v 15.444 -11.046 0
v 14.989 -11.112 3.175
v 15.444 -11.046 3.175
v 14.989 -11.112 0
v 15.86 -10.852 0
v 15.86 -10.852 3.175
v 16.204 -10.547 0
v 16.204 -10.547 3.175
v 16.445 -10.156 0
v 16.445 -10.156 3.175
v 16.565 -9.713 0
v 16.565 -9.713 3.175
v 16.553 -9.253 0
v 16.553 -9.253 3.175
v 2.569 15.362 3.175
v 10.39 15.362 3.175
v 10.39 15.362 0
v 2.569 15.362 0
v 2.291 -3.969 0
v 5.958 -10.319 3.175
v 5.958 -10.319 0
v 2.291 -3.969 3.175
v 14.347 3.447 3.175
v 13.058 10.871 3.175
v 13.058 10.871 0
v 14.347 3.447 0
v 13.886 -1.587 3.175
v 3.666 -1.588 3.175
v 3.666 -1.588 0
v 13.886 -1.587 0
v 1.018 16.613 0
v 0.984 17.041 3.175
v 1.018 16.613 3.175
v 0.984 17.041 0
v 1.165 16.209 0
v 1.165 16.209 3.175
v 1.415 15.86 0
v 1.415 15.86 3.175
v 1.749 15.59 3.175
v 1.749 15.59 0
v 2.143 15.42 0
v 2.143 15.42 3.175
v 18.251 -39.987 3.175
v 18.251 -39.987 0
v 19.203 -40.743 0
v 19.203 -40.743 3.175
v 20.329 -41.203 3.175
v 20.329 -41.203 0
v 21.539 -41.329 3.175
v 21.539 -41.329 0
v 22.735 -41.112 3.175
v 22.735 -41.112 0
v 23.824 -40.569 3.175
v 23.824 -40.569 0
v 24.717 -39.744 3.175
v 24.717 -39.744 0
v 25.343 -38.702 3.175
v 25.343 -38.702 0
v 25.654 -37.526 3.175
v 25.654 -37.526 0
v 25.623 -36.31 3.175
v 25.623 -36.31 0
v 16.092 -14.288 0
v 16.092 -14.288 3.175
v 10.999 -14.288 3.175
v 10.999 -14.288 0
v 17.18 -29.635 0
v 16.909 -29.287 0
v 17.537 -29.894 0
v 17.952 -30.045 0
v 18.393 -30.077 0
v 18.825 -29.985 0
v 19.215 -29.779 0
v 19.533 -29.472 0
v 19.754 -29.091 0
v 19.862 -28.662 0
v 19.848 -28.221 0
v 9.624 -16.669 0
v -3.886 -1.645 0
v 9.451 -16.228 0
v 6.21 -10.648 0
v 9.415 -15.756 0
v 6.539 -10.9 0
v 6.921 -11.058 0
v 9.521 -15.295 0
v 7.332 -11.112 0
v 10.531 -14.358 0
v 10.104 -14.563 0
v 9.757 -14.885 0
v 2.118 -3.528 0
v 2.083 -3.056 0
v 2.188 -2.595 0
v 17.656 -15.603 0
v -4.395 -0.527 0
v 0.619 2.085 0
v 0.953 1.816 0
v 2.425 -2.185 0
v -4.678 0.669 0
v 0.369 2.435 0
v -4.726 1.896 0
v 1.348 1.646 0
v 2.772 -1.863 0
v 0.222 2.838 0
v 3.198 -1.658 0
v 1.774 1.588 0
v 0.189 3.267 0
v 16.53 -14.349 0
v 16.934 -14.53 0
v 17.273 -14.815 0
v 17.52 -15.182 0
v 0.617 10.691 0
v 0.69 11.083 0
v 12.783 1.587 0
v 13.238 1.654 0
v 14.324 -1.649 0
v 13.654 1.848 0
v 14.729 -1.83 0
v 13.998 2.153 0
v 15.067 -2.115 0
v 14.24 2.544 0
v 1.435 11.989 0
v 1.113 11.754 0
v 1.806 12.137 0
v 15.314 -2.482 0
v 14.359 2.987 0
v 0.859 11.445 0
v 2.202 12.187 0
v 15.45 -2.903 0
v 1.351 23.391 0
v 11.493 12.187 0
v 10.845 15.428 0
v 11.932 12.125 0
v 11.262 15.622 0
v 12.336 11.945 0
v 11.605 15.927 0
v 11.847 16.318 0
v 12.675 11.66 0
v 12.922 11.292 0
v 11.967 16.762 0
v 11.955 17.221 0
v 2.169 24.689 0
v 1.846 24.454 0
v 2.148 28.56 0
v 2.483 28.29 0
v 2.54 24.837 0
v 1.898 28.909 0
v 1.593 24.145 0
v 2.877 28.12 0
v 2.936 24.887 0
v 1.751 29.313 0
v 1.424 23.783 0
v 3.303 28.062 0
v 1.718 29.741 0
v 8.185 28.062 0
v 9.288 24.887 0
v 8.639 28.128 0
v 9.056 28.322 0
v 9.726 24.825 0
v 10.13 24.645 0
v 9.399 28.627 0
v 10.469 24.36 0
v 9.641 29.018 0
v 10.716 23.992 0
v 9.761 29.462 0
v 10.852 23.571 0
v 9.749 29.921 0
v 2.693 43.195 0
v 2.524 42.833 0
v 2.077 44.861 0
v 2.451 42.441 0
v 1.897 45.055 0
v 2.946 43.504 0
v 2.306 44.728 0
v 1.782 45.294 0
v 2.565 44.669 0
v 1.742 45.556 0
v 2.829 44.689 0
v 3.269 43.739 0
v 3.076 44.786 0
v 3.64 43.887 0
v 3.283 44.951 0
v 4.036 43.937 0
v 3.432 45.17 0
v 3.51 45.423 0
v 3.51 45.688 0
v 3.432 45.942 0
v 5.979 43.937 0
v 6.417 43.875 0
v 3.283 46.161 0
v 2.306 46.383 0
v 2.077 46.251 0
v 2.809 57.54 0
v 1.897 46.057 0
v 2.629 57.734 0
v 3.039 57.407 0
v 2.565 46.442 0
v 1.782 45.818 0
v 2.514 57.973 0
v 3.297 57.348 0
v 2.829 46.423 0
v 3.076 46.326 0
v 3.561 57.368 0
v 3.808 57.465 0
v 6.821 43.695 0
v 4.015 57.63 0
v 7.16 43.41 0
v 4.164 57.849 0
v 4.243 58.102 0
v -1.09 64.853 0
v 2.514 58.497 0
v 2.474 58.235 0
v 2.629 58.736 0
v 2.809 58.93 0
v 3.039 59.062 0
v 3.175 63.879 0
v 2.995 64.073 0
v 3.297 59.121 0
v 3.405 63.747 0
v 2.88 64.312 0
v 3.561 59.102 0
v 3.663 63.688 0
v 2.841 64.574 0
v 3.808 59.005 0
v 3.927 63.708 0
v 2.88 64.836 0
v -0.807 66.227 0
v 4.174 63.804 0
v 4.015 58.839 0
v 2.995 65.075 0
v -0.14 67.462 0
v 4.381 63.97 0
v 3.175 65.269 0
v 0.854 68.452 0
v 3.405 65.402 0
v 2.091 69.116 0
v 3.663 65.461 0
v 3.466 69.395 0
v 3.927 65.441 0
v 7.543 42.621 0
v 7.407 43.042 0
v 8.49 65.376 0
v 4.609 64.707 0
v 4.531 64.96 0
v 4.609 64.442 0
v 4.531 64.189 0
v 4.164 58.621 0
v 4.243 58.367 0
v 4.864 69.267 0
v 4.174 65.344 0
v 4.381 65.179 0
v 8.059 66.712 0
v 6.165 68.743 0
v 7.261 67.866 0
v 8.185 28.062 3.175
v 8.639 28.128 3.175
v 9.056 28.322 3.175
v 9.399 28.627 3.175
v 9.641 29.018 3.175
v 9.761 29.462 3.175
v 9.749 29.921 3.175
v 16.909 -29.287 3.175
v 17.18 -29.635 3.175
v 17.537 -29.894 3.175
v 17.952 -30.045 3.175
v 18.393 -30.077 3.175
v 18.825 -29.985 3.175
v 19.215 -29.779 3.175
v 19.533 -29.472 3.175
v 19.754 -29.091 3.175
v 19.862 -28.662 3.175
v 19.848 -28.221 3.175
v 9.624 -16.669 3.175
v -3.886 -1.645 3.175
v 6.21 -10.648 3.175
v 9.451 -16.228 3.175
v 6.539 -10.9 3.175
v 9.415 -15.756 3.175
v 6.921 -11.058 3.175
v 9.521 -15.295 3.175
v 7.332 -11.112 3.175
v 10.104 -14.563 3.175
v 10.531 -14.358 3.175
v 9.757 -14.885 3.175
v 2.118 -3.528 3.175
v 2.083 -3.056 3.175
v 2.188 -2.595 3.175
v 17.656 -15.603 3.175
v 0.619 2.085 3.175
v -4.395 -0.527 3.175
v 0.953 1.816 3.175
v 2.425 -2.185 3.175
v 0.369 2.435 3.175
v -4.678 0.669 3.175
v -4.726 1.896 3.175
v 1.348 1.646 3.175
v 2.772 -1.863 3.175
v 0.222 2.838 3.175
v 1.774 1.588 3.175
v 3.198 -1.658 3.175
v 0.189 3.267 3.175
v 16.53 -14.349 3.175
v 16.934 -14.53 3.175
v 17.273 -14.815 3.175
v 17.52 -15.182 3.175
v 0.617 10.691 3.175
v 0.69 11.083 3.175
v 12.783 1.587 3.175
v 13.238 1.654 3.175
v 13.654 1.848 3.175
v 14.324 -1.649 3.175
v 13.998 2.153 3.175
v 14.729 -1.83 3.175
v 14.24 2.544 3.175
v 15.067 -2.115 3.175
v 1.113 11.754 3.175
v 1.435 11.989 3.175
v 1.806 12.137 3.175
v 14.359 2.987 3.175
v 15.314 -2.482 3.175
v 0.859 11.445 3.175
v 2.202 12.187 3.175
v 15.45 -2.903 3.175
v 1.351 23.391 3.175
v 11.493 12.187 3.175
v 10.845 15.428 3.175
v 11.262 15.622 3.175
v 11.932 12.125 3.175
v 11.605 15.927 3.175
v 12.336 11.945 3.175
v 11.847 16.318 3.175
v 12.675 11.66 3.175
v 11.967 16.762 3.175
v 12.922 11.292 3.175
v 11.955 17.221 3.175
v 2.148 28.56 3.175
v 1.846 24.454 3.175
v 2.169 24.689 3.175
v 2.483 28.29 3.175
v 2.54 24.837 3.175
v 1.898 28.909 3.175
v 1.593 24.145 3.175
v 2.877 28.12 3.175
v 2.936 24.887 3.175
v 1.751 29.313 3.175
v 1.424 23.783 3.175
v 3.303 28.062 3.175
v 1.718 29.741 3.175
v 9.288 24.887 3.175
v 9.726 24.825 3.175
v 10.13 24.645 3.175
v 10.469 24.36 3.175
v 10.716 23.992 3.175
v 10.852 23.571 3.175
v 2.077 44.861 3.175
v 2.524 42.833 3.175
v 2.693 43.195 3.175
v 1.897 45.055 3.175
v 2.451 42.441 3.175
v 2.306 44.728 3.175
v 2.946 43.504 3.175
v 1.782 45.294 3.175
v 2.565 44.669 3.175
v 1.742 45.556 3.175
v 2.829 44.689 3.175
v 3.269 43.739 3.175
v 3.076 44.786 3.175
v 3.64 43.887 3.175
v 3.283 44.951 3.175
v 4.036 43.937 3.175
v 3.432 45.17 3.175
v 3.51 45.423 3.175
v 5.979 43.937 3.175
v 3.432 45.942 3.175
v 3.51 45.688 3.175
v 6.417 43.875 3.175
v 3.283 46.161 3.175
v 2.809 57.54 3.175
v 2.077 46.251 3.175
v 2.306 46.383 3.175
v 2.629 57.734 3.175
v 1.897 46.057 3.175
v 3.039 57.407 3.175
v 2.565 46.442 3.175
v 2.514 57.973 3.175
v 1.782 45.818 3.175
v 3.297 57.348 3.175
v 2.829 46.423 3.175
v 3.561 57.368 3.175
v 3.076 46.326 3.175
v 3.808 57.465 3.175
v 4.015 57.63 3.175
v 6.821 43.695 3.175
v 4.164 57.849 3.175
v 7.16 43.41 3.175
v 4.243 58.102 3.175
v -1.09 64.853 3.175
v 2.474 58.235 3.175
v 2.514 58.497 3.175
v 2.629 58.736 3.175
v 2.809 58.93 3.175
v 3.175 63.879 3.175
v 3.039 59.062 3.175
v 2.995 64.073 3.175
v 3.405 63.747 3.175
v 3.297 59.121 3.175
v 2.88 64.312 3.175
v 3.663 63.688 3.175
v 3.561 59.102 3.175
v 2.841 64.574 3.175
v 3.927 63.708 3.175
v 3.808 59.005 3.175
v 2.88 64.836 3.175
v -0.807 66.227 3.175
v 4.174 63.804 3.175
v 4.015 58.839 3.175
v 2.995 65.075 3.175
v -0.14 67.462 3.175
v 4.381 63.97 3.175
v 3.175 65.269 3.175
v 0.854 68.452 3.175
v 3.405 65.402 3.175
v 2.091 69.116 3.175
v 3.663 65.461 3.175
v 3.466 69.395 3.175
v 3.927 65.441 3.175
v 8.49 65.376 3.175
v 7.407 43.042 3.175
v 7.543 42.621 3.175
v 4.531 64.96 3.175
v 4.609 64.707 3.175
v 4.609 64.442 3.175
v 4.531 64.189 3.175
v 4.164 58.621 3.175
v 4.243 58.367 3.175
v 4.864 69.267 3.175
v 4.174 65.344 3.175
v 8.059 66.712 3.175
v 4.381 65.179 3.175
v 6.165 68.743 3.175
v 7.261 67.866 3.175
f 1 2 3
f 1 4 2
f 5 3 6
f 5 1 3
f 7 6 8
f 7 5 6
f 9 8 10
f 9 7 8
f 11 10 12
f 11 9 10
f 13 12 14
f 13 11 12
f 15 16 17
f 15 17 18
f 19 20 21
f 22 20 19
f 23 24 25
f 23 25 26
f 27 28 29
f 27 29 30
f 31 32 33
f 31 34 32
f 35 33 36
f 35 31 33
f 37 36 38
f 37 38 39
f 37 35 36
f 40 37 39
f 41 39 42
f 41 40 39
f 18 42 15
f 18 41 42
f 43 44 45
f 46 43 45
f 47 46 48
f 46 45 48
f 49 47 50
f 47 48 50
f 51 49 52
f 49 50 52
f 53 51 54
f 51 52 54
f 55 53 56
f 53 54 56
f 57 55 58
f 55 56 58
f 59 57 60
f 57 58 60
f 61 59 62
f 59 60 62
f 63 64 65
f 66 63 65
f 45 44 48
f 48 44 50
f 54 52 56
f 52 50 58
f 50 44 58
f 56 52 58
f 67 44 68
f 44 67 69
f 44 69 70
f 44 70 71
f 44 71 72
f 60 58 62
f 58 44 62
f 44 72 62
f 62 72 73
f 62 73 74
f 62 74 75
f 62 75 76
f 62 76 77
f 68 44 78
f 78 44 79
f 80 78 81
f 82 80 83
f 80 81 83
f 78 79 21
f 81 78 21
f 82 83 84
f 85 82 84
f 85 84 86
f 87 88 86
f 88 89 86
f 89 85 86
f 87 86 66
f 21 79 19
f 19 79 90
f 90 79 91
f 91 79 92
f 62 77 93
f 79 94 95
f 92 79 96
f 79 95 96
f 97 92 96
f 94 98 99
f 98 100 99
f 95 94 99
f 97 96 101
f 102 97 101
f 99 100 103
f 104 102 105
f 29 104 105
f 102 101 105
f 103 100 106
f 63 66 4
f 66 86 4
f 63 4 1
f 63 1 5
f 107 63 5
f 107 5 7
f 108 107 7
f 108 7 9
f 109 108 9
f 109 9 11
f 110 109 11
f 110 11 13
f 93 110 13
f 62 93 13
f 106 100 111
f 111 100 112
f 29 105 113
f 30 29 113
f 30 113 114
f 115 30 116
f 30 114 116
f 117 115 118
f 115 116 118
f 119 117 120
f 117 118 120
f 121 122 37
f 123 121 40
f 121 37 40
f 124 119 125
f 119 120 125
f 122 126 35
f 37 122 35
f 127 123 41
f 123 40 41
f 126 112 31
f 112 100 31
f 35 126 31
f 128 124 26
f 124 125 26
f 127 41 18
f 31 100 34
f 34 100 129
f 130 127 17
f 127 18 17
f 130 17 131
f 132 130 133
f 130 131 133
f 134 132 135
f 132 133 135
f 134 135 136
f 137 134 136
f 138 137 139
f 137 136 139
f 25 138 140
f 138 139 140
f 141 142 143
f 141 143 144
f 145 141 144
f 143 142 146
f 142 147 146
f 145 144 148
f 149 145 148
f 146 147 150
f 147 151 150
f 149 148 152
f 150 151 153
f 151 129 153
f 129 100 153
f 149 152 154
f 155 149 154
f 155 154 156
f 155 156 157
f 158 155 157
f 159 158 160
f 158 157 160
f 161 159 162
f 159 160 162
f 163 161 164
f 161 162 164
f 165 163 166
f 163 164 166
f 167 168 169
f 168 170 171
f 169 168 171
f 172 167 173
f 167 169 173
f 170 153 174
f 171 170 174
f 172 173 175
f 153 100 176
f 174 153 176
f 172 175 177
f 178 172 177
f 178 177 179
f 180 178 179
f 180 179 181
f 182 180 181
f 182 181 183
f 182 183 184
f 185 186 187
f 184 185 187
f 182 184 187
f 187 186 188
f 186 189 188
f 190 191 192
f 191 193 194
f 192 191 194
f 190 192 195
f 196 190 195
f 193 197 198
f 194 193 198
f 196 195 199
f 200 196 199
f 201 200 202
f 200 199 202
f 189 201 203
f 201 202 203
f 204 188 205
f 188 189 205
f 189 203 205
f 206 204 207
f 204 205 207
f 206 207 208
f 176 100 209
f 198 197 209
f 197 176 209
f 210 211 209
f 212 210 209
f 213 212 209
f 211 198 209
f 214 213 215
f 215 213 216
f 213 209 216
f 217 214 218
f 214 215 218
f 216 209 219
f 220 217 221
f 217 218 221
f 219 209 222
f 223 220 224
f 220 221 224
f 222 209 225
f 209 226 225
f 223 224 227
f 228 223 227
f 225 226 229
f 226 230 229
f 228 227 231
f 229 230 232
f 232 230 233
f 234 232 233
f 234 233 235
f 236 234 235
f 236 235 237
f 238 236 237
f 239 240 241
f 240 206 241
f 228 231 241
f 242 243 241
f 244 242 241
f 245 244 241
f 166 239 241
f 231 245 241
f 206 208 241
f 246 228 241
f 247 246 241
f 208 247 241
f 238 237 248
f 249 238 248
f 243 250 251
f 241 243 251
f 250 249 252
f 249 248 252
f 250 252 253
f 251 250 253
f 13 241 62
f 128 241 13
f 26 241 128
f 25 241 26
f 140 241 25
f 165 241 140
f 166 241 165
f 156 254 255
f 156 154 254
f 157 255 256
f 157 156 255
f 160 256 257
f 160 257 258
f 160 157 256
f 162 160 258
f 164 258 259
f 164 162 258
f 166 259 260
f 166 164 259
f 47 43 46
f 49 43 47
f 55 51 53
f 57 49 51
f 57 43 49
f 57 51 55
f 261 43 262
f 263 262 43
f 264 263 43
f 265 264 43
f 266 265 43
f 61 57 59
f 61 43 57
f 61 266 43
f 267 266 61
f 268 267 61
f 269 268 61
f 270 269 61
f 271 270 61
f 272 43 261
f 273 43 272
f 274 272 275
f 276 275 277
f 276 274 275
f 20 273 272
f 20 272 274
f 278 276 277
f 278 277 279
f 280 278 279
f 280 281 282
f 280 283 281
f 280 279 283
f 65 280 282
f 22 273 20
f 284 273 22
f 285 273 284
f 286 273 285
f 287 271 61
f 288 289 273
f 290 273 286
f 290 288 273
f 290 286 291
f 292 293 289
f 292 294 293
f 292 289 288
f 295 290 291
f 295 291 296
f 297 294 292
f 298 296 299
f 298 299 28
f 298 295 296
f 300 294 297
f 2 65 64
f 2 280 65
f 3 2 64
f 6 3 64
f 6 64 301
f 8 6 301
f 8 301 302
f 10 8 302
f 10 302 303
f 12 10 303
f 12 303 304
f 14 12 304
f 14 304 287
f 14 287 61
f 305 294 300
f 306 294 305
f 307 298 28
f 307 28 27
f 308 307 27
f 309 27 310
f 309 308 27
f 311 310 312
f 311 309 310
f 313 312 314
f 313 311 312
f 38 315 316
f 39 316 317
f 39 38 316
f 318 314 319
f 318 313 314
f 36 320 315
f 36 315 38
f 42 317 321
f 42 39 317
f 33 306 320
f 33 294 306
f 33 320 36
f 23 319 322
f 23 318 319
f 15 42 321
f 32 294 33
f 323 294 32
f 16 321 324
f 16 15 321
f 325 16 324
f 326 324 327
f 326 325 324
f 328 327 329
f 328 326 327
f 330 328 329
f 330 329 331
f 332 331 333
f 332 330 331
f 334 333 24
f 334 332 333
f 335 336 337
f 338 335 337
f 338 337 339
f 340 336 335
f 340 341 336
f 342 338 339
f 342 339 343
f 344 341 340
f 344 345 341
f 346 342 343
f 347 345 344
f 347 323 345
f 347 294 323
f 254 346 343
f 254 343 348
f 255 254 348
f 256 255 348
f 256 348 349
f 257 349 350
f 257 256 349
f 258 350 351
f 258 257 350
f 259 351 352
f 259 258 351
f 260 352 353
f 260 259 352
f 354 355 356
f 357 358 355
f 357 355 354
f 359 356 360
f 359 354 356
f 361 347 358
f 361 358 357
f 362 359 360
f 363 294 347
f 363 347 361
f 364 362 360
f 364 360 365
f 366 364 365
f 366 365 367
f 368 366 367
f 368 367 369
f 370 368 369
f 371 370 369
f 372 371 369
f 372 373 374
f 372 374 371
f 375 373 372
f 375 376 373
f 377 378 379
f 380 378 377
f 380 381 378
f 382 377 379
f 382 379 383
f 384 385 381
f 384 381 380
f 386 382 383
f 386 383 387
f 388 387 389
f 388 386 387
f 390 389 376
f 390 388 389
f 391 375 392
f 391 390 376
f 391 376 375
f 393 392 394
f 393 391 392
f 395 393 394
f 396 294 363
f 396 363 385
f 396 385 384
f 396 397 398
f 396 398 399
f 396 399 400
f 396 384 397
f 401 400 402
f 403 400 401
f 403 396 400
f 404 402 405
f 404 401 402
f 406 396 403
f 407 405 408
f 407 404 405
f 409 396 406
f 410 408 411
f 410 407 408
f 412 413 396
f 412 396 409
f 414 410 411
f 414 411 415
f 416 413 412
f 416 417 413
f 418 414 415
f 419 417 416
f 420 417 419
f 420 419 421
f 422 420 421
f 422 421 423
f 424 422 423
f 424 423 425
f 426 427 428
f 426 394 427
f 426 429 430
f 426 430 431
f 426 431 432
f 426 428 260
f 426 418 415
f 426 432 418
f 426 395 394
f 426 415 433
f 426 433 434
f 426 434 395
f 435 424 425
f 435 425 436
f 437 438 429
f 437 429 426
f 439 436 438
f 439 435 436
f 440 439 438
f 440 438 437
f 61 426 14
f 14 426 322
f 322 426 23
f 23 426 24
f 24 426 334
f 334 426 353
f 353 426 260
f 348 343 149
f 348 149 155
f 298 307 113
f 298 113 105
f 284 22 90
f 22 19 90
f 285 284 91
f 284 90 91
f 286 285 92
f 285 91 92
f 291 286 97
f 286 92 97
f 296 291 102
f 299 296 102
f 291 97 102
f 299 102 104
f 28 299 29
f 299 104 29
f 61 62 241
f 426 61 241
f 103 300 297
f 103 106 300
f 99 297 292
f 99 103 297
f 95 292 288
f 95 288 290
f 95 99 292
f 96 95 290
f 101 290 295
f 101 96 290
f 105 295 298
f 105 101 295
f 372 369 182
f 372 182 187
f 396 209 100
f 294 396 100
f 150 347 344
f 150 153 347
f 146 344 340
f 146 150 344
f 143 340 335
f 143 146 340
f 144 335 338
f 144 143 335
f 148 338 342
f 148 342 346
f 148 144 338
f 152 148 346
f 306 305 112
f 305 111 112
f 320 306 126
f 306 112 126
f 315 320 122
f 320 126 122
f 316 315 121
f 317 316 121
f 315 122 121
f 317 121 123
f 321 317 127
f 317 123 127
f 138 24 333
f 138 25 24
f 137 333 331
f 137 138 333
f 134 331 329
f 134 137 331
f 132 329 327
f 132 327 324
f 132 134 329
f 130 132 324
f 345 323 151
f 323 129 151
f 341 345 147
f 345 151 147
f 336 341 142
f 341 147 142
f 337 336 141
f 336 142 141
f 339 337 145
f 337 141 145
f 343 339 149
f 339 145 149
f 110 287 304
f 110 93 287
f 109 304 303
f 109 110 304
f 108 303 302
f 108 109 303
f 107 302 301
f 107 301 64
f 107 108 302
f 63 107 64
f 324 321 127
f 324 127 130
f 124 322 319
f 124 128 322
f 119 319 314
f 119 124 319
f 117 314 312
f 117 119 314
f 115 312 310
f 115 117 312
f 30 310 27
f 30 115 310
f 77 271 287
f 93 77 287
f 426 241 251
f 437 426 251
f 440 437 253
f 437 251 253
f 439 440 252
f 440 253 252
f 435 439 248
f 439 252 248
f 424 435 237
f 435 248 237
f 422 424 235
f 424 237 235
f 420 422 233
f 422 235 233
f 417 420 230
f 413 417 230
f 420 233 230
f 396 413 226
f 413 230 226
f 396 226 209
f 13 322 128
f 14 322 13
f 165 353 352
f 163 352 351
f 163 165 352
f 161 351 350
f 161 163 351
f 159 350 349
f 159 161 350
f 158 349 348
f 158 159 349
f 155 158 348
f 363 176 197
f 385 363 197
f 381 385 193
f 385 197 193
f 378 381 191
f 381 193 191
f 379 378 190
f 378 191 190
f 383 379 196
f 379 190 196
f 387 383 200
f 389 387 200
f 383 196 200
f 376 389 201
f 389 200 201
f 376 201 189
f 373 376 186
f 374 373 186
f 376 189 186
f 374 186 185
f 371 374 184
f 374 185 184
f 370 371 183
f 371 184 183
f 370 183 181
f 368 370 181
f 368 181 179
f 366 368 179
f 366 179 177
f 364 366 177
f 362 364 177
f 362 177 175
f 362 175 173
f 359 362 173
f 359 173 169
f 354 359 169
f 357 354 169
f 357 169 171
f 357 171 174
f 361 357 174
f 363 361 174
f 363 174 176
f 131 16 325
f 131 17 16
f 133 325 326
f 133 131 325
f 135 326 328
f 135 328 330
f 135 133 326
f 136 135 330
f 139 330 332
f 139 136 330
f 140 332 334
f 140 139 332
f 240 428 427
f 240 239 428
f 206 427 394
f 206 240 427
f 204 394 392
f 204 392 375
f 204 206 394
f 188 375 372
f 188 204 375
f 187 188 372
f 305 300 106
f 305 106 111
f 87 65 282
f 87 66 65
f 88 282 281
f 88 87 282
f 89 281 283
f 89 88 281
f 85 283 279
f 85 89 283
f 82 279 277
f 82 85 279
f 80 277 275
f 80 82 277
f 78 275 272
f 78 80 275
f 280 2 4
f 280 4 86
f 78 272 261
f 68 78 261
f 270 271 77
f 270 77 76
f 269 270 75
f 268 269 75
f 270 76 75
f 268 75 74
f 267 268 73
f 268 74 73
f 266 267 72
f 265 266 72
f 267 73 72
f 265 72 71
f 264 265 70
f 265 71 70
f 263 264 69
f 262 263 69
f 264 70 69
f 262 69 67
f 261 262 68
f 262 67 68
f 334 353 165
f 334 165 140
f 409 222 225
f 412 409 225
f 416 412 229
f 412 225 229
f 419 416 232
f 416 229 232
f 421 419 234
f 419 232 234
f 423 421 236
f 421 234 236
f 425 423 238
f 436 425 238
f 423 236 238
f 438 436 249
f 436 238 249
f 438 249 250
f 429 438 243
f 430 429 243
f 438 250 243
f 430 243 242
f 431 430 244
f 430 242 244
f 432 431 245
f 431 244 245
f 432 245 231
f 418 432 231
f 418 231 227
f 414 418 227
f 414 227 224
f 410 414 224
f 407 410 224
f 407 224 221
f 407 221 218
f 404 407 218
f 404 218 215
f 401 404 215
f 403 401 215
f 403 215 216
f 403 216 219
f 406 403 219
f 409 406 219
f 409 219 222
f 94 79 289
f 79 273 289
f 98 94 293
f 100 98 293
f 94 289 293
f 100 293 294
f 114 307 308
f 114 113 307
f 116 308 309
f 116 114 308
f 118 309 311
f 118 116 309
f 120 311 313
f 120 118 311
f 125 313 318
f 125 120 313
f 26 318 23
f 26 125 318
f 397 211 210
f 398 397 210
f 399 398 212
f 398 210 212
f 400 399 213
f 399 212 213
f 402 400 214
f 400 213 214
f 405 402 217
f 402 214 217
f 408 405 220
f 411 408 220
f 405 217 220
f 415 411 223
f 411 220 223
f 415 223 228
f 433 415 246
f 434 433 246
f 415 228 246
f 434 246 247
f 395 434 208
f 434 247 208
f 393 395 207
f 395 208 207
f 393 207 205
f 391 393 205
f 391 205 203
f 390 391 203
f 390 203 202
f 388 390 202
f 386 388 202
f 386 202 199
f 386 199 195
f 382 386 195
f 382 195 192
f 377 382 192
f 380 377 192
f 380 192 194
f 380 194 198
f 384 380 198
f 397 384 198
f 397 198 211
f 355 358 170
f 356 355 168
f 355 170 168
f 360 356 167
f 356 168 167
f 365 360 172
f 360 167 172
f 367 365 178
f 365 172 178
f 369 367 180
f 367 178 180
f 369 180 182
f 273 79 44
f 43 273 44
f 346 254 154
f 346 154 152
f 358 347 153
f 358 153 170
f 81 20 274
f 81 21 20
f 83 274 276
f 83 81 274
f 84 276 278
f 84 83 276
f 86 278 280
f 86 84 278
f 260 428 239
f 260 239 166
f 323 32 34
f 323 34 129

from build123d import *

# Parameters (mm, degrees)
BOSS_EXTRUDE1_DEPTH   = 3.175
FILLET1_R             = 6.35
F_2_56_TAPPED_HOLE2_D = 1.778
CUT_EXTRUDE1_DEPTH    = 75.069947742
FILLET2_R             = 1.5875


with BuildPart() as part:
    # Sketch1 → Boss-Extrude1 (new body)
    with BuildSketch(Plane.XY):
        with BuildLine():
            Line((-4.835969239, 0), (18.250637604, -39.987176027))
            ThreePointArc((18.250637604, -39.987176027), (23.298677844, -40.879278308), (25.623151786, -36.310320261))
            Line((25.623151786, -36.310320261), (8.49045675, 65.376366097))
            ThreePointArc((8.49045675, 65.376366097), (3.466101861, 69.394963614), (-1.090256537, 64.852622125))
            Line((-1.090256537, 64.852622125), (-4.835969239, 0))
        make_face()
    extrude(amount=BOSS_EXTRUDE1_DEPTH)

    # Fillet1
    fillet1_edges = [part.edges().sort_by_distance(p)[0] for p in [
        (-4.835969239, 0, 1.5875),
    ]]
    fillet(fillet1_edges, radius=FILLET1_R)

    # #2-56 Tapped Hole2 (through all)
    with Locations(Plane(origin=(2.631187962, 45.555933465, 3.175), x_dir=(1, 0, 0), z_dir=(0, 0, 1))):
        with Locations((0, 0), (0.732297358, 12.678869847), (1.098446037, 19.01830477)):
            Hole(F_2_56_TAPPED_HOLE2_D / 2)

    # Sketch5 → Cut-Extrude1 (cut, through all)
    with BuildSketch(Plane.XY.offset(3.175)):
        Polygon((2.537667609, 43.936738235), (7.314221402, 43.936738235), (10.071596328, 28.061738235), (1.620770386, 28.061738235), align=None)
        Polygon((1.437390941, 24.886738235), (10.623071313, 24.886738235), (12.277496268, 15.361738235), (0.887252607, 15.361738235), align=None)
        Polygon((0.703873162, 12.186738235), (12.828971253, 12.186738235), (14.669983772, 1.5875), (0.091689722, 1.5875), align=None)
        Polygon((0.916543552, -1.5875), (15.221458757, -1.5875), (16.875883712, -11.1125), (6.415804866, -11.1125), align=None)
        Polygon((21.376833522, -37.025761765), (17.427358698, -14.2875), (8.248891971, -14.2875), align=None)
    extrude(amount=-CUT_EXTRUDE1_DEPTH, mode=Mode.SUBTRACT)

    # Fillet2
    fillet2_edges = [part.edges().sort_by_distance(p)[0] for p in [
        (1.620770386, 28.061738235, 1.5875),
        (2.537667609, 43.936738235, 1.5875),
        (7.314221402, 43.936738235, 1.5875),
        (10.071596328, 28.061738235, 1.5875),
        (6.415804866, -11.1125, 1.5875),
        (0.916543552, -1.5875, 1.5875),
        (15.221458757, -1.5875, 1.5875),
        (16.875883712, -11.1125, 1.5875),
        (0.091689722, 1.5875, 1.5875),
        (0.703873162, 12.186738235, 1.5875),
        (12.828971253, 12.186738235, 1.5875),
        (14.669983772, 1.5875, 1.5875),
        (0.887252607, 15.361738235, 1.5875),
        (1.437390941, 24.886738235, 1.5875),
        (10.623071313, 24.886738235, 1.5875),
        (12.277496268, 15.361738235, 1.5875),
        (21.376833522, -37.025761765, 1.5875),
        (8.248891971, -14.2875, 1.5875),
        (17.427358698, -14.2875, 1.5875),
    ]]
    fillet(fillet2_edges, radius=FILLET2_R)


solid = part.part
